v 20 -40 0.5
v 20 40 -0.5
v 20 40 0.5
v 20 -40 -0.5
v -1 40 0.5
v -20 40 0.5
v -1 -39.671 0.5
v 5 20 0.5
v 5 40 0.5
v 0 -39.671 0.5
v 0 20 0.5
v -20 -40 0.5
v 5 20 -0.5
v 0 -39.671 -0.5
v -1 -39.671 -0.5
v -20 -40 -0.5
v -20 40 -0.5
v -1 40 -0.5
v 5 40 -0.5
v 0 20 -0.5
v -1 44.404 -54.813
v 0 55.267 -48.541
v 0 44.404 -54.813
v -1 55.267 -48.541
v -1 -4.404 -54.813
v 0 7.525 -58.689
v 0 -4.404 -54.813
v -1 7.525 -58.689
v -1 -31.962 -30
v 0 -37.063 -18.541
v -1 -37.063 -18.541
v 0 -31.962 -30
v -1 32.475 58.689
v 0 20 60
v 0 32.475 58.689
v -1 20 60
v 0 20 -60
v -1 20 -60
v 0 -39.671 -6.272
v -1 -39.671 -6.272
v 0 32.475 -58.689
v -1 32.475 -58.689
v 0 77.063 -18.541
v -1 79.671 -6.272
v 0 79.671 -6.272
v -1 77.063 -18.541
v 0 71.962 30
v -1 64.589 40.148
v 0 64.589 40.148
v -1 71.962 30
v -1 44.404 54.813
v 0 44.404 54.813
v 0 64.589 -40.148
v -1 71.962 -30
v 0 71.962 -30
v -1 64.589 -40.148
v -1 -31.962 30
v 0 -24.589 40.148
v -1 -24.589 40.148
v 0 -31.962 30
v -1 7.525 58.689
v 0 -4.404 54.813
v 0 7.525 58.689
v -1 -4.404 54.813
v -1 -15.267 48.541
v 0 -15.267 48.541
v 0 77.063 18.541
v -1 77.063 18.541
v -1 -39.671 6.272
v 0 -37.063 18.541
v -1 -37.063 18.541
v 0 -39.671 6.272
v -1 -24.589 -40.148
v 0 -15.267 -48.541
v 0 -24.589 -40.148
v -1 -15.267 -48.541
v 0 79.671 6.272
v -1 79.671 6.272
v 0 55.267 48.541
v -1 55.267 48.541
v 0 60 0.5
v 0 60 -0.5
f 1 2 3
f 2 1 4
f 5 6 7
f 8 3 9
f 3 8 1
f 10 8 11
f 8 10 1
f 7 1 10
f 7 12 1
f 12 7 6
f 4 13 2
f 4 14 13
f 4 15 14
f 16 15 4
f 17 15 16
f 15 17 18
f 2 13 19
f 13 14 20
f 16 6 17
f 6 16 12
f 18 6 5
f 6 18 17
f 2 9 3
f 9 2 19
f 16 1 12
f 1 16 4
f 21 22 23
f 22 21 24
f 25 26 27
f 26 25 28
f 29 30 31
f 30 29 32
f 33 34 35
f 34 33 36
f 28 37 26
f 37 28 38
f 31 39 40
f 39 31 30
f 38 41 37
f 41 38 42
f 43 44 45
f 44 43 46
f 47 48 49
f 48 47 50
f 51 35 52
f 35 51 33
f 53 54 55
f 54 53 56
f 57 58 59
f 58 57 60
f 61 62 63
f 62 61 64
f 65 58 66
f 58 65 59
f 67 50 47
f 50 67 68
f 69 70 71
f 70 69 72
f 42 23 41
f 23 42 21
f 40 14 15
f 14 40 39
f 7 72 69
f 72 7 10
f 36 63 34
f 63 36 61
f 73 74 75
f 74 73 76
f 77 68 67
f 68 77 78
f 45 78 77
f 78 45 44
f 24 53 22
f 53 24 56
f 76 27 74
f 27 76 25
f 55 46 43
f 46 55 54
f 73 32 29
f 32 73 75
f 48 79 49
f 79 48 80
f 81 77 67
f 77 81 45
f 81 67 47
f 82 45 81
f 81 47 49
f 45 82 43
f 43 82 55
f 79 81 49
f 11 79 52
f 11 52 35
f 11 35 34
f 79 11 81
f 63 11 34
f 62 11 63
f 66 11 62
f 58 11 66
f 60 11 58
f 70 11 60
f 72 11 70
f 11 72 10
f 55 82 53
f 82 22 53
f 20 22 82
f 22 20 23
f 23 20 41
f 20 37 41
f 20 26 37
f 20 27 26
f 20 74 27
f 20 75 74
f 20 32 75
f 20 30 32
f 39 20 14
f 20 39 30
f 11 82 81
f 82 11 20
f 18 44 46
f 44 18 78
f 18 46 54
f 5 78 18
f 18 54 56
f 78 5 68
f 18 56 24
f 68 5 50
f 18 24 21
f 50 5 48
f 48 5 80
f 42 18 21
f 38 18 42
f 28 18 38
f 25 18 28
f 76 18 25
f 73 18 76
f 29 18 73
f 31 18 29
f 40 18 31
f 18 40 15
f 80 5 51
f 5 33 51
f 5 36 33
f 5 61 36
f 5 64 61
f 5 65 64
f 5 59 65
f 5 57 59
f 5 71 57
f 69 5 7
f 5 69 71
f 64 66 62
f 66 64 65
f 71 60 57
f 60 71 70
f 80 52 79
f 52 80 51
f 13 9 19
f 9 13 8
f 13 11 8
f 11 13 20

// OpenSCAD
difference(){
union(){
cube([40,80,1], true);
translate([-1, 80/4, 0]) rotate([0,90,0]) cylinder(h=1, r=3*80/4);
}
translate([0,80/4,-0.5]) cube([5,40,1]);
}
